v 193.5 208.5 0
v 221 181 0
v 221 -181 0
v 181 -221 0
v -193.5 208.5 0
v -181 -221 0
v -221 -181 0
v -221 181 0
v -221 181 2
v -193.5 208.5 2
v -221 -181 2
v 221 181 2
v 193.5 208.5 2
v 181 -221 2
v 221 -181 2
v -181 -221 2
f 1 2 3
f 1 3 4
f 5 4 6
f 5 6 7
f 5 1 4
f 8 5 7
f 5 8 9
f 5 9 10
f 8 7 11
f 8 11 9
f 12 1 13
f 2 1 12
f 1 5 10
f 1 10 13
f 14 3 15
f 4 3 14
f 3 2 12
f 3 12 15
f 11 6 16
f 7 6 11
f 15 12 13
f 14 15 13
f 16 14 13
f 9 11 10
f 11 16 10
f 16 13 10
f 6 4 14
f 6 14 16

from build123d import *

# Parameters (mm, degrees)
EXTRUDE_1_DEPTH          = 2
SKETCH_3_W               = 440.695596705
SKETCH_3_H               = 44.042045092
CUT_EXTRUDE_1_DEPTH      = 10
CUT_EXTRUDE_1_DEPTH_BACK = 10


with BuildPart() as part:
    # 스케치1 → 보스-돌출1 (new body)
    with BuildSketch(Plane.XY):
        Polygon((-221, 181), (-181, 221), (181, 221), (221, 181), (221, -181), (181, -221), (-181, -221), (-221, -181), align=None)
    extrude(amount=EXTRUDE_1_DEPTH)

    # 스케치3 → 컷-돌출1 (cut, two sides)
    with BuildSketch(Plane.XY) as cut_extrude_1_sk:
        with Locations((5.347798353, 230.521022546)):
            Rectangle(SKETCH_3_W, SKETCH_3_H)
    extrude(amount=CUT_EXTRUDE_1_DEPTH, mode=Mode.SUBTRACT)
    extrude(cut_extrude_1_sk.sketch, amount=-CUT_EXTRUDE_1_DEPTH_BACK, mode=Mode.SUBTRACT)


solid = part.part
